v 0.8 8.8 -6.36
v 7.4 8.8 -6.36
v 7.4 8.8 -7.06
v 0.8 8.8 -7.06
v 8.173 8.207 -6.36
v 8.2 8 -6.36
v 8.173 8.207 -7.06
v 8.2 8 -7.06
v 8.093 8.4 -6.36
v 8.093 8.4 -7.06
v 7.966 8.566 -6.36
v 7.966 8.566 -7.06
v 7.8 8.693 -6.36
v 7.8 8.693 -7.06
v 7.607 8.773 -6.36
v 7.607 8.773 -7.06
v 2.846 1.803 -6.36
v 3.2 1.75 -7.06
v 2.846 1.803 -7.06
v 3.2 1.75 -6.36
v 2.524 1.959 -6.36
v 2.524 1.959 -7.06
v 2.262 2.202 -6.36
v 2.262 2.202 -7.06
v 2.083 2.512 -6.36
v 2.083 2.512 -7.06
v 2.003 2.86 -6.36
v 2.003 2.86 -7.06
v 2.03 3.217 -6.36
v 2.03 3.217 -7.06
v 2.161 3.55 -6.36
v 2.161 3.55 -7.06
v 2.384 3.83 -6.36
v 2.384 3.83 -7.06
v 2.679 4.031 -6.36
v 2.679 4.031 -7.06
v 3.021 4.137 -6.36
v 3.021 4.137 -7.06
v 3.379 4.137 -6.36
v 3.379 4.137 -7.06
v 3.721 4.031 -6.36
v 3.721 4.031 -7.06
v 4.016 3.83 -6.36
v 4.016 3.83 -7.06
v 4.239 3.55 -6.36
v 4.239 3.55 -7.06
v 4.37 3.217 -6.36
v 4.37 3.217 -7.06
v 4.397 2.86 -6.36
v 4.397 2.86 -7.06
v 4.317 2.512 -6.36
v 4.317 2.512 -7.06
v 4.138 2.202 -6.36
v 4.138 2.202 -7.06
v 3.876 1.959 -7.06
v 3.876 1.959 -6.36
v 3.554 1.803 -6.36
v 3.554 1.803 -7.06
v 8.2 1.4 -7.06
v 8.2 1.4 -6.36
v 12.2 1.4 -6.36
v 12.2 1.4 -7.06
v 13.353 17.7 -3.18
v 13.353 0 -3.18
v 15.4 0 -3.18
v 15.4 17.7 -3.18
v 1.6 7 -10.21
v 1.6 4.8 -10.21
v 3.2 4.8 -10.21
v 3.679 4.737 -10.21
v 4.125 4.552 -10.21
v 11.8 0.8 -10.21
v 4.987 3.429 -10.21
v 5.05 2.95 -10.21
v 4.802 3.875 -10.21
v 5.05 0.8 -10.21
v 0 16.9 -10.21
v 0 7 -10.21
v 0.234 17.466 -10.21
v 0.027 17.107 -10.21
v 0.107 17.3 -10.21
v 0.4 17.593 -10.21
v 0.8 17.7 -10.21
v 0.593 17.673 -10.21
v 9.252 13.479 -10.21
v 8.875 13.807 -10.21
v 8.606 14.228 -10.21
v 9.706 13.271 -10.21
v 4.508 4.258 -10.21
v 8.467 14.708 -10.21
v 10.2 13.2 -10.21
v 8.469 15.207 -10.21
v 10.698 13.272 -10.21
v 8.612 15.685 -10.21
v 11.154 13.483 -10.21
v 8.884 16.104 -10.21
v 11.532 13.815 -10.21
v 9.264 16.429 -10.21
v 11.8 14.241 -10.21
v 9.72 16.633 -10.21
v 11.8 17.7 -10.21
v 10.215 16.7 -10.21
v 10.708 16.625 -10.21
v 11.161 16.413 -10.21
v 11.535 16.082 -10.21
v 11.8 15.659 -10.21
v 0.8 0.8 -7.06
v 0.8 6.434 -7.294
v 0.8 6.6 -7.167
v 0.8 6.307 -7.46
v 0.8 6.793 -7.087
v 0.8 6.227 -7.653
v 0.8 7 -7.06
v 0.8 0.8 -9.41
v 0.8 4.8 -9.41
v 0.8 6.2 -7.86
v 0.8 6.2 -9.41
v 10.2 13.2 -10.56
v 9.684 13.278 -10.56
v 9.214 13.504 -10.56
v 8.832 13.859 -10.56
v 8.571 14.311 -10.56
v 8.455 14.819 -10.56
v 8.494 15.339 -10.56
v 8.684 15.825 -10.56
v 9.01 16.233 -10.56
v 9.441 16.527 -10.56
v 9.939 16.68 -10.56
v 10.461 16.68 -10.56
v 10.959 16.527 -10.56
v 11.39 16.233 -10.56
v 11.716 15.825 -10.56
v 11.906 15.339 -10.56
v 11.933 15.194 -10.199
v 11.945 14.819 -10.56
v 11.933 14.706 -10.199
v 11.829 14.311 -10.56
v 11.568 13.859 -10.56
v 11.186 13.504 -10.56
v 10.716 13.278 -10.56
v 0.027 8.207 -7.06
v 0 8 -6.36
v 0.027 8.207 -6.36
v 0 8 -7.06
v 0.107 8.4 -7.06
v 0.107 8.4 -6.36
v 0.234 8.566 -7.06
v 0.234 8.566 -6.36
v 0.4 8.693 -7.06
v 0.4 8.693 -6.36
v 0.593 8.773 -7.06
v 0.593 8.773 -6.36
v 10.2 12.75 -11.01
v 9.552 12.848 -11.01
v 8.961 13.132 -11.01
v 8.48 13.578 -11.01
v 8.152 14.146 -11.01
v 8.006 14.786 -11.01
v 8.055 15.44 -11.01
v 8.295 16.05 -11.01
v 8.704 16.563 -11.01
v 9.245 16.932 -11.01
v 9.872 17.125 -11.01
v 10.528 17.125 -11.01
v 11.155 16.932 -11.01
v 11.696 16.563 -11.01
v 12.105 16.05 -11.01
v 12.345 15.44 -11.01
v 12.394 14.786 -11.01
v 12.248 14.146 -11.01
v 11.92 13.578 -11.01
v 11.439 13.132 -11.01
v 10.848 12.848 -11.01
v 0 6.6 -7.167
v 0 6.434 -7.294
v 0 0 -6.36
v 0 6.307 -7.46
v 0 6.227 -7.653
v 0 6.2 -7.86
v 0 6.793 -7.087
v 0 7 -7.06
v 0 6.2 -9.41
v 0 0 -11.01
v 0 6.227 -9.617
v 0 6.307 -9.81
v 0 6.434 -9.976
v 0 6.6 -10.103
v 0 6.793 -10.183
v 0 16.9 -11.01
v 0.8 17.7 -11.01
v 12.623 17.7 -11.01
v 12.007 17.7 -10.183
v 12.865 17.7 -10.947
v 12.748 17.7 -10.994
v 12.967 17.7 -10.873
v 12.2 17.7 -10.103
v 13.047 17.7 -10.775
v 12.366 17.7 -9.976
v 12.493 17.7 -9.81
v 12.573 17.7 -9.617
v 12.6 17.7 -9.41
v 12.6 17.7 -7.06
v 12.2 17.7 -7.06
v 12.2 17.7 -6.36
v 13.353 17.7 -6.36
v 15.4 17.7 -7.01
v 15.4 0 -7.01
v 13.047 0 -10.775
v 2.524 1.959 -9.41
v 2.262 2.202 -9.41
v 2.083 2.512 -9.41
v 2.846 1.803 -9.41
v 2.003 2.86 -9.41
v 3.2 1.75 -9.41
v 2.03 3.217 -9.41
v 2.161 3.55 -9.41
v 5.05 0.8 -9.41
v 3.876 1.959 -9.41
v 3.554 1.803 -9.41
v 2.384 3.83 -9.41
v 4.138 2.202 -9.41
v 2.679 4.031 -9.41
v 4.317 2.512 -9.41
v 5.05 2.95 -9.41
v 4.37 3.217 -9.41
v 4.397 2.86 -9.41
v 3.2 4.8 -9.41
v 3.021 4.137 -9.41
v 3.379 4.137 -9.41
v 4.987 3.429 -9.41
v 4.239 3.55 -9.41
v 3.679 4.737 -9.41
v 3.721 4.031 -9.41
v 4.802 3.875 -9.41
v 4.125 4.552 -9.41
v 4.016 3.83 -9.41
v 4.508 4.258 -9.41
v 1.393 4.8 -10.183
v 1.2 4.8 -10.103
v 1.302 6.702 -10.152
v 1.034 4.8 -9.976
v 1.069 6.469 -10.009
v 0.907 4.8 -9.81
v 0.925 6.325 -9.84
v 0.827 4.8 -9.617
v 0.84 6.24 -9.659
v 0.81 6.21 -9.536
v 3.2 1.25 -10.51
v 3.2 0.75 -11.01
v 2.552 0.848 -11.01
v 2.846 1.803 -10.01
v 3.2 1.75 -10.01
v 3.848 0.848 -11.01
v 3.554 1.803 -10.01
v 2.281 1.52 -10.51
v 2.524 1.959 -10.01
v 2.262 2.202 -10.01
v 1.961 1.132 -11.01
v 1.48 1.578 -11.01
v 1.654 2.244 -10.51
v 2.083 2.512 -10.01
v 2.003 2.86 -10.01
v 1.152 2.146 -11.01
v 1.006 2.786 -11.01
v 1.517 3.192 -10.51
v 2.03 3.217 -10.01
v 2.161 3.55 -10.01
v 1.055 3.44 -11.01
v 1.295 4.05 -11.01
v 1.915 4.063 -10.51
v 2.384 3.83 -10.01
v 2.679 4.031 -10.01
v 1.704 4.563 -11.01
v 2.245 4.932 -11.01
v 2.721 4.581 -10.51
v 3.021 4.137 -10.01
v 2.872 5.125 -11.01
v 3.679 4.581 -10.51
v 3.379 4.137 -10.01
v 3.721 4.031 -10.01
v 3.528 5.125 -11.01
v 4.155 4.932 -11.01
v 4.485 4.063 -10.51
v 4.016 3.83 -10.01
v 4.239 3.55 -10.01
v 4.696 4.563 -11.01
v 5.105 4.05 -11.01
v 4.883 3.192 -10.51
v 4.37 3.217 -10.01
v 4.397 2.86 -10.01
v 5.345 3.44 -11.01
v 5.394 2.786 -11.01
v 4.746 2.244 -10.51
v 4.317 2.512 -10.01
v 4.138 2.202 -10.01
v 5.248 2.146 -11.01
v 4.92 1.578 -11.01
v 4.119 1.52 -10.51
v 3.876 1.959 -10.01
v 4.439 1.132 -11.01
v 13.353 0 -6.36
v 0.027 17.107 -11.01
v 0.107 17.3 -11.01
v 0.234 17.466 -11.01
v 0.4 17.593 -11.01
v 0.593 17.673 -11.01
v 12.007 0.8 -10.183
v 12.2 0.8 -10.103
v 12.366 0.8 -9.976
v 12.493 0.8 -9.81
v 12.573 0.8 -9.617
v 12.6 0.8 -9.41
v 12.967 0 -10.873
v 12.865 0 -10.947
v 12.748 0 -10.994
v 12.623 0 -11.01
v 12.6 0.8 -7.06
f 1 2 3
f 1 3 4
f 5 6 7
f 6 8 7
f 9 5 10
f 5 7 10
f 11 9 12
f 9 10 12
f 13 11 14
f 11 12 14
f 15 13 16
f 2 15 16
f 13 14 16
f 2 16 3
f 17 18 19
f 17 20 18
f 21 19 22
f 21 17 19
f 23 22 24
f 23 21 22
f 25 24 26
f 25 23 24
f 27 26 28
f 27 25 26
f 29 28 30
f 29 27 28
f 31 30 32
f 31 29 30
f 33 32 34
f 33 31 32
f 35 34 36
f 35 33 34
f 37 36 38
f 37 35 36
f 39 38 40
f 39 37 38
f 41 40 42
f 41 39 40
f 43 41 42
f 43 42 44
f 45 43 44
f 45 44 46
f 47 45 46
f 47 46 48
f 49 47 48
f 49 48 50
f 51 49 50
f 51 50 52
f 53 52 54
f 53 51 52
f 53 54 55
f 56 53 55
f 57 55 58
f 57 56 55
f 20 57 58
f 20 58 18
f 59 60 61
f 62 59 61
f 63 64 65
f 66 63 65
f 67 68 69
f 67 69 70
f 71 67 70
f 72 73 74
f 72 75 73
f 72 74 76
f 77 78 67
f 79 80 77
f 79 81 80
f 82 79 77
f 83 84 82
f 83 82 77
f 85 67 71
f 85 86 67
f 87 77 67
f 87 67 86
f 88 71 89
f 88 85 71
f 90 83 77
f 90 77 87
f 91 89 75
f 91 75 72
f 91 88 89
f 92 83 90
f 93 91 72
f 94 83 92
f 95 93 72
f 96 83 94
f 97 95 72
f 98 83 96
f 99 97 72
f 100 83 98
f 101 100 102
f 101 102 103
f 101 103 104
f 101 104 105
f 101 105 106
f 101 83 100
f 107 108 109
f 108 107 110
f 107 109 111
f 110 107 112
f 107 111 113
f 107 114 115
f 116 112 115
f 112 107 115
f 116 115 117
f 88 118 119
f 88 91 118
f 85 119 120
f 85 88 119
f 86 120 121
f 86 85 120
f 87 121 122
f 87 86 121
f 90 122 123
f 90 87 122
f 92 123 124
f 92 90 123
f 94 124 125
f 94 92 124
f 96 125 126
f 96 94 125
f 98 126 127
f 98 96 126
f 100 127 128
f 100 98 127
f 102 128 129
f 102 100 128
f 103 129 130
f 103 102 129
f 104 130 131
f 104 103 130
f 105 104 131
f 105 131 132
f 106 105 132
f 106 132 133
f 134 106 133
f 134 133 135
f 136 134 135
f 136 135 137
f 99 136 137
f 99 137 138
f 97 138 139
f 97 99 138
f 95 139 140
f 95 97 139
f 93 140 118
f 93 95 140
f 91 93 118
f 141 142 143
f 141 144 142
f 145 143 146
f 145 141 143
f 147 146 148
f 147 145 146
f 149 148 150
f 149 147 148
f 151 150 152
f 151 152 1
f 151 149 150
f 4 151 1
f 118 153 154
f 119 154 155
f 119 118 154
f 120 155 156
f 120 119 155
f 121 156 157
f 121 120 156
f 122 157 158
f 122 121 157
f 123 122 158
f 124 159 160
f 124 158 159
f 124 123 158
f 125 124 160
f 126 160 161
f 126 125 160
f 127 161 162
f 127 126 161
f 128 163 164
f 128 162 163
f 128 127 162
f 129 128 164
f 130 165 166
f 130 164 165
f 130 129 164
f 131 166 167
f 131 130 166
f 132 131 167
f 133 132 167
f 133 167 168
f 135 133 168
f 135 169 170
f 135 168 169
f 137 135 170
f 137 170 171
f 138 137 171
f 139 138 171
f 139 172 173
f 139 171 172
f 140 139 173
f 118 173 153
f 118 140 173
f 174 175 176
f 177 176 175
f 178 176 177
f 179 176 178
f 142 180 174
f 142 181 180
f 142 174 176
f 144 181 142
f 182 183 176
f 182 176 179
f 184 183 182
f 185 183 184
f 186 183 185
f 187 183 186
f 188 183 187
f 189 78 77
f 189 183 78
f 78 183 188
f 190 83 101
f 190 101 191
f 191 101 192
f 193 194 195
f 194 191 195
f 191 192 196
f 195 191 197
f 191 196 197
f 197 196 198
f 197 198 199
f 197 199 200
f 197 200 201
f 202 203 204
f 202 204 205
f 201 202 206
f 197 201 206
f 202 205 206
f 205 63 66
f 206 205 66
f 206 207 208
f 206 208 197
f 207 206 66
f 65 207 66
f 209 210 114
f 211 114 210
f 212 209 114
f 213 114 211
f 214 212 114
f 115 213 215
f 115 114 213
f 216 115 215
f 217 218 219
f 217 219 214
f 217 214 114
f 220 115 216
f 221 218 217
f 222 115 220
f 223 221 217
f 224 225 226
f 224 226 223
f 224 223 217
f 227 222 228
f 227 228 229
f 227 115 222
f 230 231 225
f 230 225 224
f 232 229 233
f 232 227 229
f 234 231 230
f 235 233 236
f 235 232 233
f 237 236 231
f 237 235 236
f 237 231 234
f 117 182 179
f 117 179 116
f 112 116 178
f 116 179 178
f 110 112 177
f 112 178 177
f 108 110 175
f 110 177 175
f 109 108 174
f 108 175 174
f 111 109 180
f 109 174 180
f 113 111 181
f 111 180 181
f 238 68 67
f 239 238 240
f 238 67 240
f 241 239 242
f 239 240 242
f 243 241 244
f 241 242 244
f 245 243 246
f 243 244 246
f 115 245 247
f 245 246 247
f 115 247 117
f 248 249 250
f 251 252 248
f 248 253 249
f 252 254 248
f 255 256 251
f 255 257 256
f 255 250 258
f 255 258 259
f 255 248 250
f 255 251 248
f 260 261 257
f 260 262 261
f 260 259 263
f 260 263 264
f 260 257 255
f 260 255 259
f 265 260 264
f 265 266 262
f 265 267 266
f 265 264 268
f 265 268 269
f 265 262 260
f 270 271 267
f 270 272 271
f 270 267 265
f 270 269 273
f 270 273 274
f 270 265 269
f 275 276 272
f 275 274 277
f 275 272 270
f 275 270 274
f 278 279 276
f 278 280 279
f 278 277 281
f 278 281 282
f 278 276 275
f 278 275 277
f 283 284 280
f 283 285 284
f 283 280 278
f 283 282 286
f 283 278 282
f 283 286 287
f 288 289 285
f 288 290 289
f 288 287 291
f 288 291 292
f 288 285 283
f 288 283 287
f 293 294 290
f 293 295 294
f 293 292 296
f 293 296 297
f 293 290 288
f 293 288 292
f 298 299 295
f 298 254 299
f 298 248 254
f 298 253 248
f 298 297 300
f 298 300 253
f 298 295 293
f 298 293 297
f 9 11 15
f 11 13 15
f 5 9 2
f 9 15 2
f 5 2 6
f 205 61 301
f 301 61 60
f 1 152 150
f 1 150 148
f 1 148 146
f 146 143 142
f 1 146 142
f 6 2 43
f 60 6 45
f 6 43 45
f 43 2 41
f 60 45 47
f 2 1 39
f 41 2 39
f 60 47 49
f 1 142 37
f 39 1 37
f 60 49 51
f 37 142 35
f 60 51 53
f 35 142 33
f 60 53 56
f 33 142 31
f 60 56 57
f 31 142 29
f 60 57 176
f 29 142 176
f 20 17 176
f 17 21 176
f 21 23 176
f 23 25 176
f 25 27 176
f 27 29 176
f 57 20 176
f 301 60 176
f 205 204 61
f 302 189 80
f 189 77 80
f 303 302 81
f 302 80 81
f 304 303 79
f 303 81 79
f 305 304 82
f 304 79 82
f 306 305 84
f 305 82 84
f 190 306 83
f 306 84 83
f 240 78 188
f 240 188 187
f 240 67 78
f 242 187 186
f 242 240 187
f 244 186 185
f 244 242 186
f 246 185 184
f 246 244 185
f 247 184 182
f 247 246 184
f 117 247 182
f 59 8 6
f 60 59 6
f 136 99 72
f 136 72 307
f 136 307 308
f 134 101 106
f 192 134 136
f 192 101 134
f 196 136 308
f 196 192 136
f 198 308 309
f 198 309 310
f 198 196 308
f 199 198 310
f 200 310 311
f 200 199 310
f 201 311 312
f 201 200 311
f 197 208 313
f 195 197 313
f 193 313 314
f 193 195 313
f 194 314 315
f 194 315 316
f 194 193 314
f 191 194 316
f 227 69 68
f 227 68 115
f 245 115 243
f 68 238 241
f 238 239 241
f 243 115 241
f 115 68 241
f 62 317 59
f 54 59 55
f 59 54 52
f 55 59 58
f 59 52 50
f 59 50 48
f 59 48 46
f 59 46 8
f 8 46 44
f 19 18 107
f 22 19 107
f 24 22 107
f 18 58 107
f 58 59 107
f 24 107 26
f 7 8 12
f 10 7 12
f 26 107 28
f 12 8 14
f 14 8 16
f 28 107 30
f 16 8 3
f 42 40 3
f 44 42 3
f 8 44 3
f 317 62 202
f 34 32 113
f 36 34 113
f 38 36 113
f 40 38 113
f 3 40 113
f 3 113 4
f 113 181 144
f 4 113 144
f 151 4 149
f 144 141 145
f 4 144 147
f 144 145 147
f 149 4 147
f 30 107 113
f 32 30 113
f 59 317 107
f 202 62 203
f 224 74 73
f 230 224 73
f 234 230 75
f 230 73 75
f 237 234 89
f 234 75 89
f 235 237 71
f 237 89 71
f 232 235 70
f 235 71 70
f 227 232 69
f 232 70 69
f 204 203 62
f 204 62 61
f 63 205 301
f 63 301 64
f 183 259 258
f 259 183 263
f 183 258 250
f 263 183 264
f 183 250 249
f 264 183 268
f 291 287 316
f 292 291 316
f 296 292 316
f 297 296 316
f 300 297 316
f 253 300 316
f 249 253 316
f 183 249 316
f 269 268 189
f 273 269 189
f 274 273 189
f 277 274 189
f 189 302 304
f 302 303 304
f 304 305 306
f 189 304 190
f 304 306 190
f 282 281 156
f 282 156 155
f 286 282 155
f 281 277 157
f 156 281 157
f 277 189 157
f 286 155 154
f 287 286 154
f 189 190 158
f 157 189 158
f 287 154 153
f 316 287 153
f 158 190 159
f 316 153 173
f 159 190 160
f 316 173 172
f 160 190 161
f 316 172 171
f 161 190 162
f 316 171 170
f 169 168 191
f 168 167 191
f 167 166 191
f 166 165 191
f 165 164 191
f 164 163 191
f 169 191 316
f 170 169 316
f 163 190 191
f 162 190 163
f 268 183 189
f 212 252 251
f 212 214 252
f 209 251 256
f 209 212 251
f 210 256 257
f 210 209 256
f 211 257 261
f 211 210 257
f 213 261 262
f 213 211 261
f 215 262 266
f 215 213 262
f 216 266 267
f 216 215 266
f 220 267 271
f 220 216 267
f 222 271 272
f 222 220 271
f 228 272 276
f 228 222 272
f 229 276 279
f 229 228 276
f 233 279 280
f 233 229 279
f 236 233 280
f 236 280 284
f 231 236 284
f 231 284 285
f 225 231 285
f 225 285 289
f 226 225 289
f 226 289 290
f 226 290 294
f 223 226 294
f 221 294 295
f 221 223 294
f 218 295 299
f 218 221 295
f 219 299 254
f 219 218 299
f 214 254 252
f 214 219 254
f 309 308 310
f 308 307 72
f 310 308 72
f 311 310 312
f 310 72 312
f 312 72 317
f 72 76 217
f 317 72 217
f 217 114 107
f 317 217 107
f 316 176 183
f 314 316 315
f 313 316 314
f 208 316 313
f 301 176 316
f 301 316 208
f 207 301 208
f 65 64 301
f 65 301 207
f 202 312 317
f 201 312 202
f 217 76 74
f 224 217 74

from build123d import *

# Parameters (mm, degrees)
BOSS_EXTRUDE1_DEPTH                             = 15.4
CUT_EXTRUDE2_REACH                              = 25.918
SKETCH3_W                                       = 7.5
SKETCH3_H                                       = 11.5
BOSS_EXTRUDE3_REACH                             = 25.918
SKETCH4_W                                       = 0.8
SKETCH4_H                                       = 6.2
SKETCH4_W_2                                     = 2.8
SKETCH4_H_2                                     = 17.7
SKETCH10_W                                      = 4
SKETCH10_H                                      = 0.7
CUT_EXTRUDE4_DEPTH                              = 16.3
BOSS_EXTRUDE4_DEPTH                             = 0.8
CSK_FOR_M2_FLAT_HEAD_MACHINE_SCREW3_D           = 2.4
CSK_FOR_M2_FLAT_HEAD_MACHINE_SCREW3_CSINK_D     = 4.4
CSK_FOR_M2_FLAT_HEAD_MACHINE_SCREW3_CSINK_ANGLE = 90
MOVE_FACE1_BY                                   = 0.6
SKETCH14_W                                      = 8.2
SKETCH14_H                                      = 8.3
CUT_EXTRUDE6_DEPTH                              = 0.7
SKETCH3_2_W                                     = 7.5
SKETCH3_2_H                                     = 11.5
BOSS_EXTRUDE6_DEPTH                             = 0.8
FILLET3_R                                       = 0.8
CHAMFER1_SIZE                                   = 2.5
CHAMFER1_SIZE2                                  = 4
SKETCH12_W                                      = 2.0475
SKETCH12_H                                      = 3.18
BOSS_EXTRUDE5_DEPTH                             = 17.7
FILLET5_R                                       = 0.5
SKETCH11_R                                      = 1.75
CUT_EXTRUDE5_DEPTH                              = 25.492262043
CUT_EXTRUDE5_DIRECTION_2_REACH                  = 26.492


with BuildPart() as part:
    # Sketch2 → Boss-Extrude1 (new body)
    with BuildSketch(Plane(origin=(0, 0, 0), x_dir=(0, 0, -1), z_dir=(1, 0, 0))):
        Polygon((0, 0), (-4.65, 0), (-4.65, 17.7), (-3.85, 17.7), (-3.85, 0.8), (-0.7, 0.8), (-0.7, 17.7), (0, 17.7), align=None)
    extrude(amount=BOSS_EXTRUDE1_DEPTH)

    # Sketch3 → Cut-Extrude2 (cut, up to next)
    with BuildSketch(Plane.XY.offset(4.65), mode=Mode.PRIVATE) as cut_extrude2_sk1:
        with Locations((3.75, 11.95)):
            Rectangle(SKETCH3_W, SKETCH3_H)
    cut_extrude2_tool1 = extrude(cut_extrude2_sk1.sketch, amount=-CUT_EXTRUDE2_REACH, mode=Mode.PRIVATE) & part.part
    add(cut_extrude2_tool1.solids().sort_by_distance((3.75, 11.95, 4.65))[0], mode=Mode.SUBTRACT)

    # Sketch4 → Boss-Extrude3 (add, up to next)
    with BuildSketch(Plane.XY.offset(4.65), mode=Mode.PRIVATE) as boss_extrude3_sk1:
        with Locations((0.4, 3.1)):
            Rectangle(SKETCH4_W, SKETCH4_H)
    boss_extrude3_tool1 = extrude(boss_extrude3_sk1.sketch, amount=-BOSS_EXTRUDE3_REACH, mode=Mode.PRIVATE) - part.part
    # Sketch4 → Boss-Extrude3 (add, up to next)
    with BuildSketch(Plane.XY.offset(4.65), mode=Mode.PRIVATE) as boss_extrude3_sk2:
        with Locations((14, 8.85)):
            Rectangle(SKETCH4_W_2, SKETCH4_H_2)
    boss_extrude3_tool2 = extrude(boss_extrude3_sk2.sketch, amount=-BOSS_EXTRUDE3_REACH, mode=Mode.PRIVATE) - part.part
    add(boss_extrude3_tool1.solids().sort_by_distance((0.4, 3.1, 4.65))[0])
    add(boss_extrude3_tool2.solids().sort_by_distance((14, 8.85, 4.65))[0])

    # Sketch10 → Cut-Extrude4 (cut)
    with BuildSketch(Plane(origin=(0, 17.7, 0), x_dir=(1, 0, 0), z_dir=(0, 1, 0))):
        with Locations((10.2, -0.35)):
            Rectangle(SKETCH10_W, SKETCH10_H)
    extrude(amount=-CUT_EXTRUDE4_DEPTH, mode=Mode.SUBTRACT)

    # Sketch6 → Boss-Extrude4 (add)
    with BuildSketch(Plane(origin=(0, 0, 3.85), x_dir=(-1, 0, 0), z_dir=(0, 0, -1))):
        with BuildLine():
            Line((-0.8, 0.8), (-5.05, 0.8))
            Line((-5.05, 0.8), (-5.05, 2.95))
            ThreePointArc((-5.05, 2.95), (-4.508147545, 4.258147545), (-3.2, 4.8))
            Line((-3.2, 4.8), (-0.8, 4.8))
            Line((-0.8, 4.8), (-0.8, 0.8))
        make_face()
    extrude(amount=BOSS_EXTRUDE4_DEPTH)

    # CSK for M2 Flat Head Machine Screw3 (through all)
    with Locations(Plane(origin=(10.2, 14.95, 4.65), x_dir=(0, 1, 0), z_dir=(0, 0, 1))):
        with Locations((0, 0), (-12, 7)):
            CounterSinkHole(CSK_FOR_M2_FLAT_HEAD_MACHINE_SCREW3_D / 2, CSK_FOR_M2_FLAT_HEAD_MACHINE_SCREW3_CSINK_D / 2, counter_sink_angle=CSK_FOR_M2_FLAT_HEAD_MACHINE_SCREW3_CSINK_ANGLE)

    # Move Face1: a face moved inward by 0.6
    extrude(part.faces().sort_by_distance((4.1, 17.7, 0.35))[0], amount=MOVE_FACE1_BY, dir=(0, -1, 0), mode=Mode.SUBTRACT)

    # Sketch14 → Cut-Extrude6 (cut)
    with BuildSketch(Plane(origin=(0, 0, 0), x_dir=(-1, 0, 0), z_dir=(0, 0, -1))):
        with Locations((-4.1, 12.95)):
            Rectangle(SKETCH14_W, SKETCH14_H)
    extrude(amount=-CUT_EXTRUDE6_DEPTH, mode=Mode.SUBTRACT)

    # Sketch3<2> → Boss-Extrude6 (add)
    with BuildSketch(Plane.XY.offset(4.65)):
        with Locations((3.75, 11.95)):
            Rectangle(SKETCH3_2_W, SKETCH3_2_H)
    extrude(amount=-BOSS_EXTRUDE6_DEPTH)

    # Fillet3
    fillet3_edges = [part.edges().sort_by_distance(p)[0] for p in [
        (0.8, 5.5, 3.85),
        (0, 8.8, 0.35),
        (8.2, 8.8, 0.35),
        (0, 17.7, 4.25),
        (0.4, 6.2, 3.85),
        (0.4, 6.2, 0.7),
        (12.6, 9.25, 3.85),
    ]]
    fillet(fillet3_edges, radius=FILLET3_R)

    # Chamfer1
    chamfer1_edges = [part.edges().sort_by_distance(p)[0] for p in [
        (15.4, 8.85, 4.65),
    ]]
    chamfer1_side = [part.faces().sort_by_distance(p)[0] for p in [
        (7.829915164, 8.832514614, 4.65),
    ]]
    chamfer(chamfer1_edges, length=CHAMFER1_SIZE, length2=CHAMFER1_SIZE2, reference=chamfer1_side[0])

    # Sketch12 → Boss-Extrude5 (add)
    with BuildSketch(Plane(origin=(0, 17.7, 0), x_dir=(1, 0, 0), z_dir=(0, 1, 0))):
        with Locations((14.37625, 1.59)):
            Rectangle(SKETCH12_W, SKETCH12_H)
    extrude(amount=-BOSS_EXTRUDE5_DEPTH)

    # Fillet5
    fillet5_edges = [part.edges().sort_by_distance(p)[0] for p in [
        (12.9, 8.85, 4.65),
    ]]
    fillet(fillet5_edges, radius=FILLET5_R)

    # Sketch11 → Cut-Extrude5 (cut)
    with BuildSketch(Plane(origin=(0, 0, 3.85), x_dir=(-1, 0, 0), z_dir=(0, 0, -1))):
        with Locations(Location((-10.2, 14.95, 0), (0, 0, 270))):
            Circle(SKETCH11_R)
    extrude(amount=-CUT_EXTRUDE5_DEPTH, mode=Mode.SUBTRACT)

    # Sketch11 → Cut-Extrude5 direction 2 (cut, up to next)
    with BuildSketch(Plane(origin=(0, 0, 3.85), x_dir=(-1, 0, 0), z_dir=(0, 0, -1)), mode=Mode.PRIVATE) as cut_extrude5_direction_2_sk1:
        with Locations(Location((-10.2, 14.95, 0), (0, 0, 270))):
            Circle(SKETCH11_R)
    cut_extrude5_direction_2_tool1 = extrude(cut_extrude5_direction_2_sk1.sketch, amount=CUT_EXTRUDE5_DIRECTION_2_REACH, mode=Mode.PRIVATE) & part.part
    add(cut_extrude5_direction_2_tool1.solids().sort_by_distance((10.2, 14.95, 3.85))[0], mode=Mode.SUBTRACT)


with BuildPart() as body_2:
    # Mirror1: mirrored copy
    add(part.part.mirror(Plane(origin=(13.3525, 0, -3.18), x_dir=(1, 0, 0), z_dir=(0, 0, -1))))


solid = body_2.part
